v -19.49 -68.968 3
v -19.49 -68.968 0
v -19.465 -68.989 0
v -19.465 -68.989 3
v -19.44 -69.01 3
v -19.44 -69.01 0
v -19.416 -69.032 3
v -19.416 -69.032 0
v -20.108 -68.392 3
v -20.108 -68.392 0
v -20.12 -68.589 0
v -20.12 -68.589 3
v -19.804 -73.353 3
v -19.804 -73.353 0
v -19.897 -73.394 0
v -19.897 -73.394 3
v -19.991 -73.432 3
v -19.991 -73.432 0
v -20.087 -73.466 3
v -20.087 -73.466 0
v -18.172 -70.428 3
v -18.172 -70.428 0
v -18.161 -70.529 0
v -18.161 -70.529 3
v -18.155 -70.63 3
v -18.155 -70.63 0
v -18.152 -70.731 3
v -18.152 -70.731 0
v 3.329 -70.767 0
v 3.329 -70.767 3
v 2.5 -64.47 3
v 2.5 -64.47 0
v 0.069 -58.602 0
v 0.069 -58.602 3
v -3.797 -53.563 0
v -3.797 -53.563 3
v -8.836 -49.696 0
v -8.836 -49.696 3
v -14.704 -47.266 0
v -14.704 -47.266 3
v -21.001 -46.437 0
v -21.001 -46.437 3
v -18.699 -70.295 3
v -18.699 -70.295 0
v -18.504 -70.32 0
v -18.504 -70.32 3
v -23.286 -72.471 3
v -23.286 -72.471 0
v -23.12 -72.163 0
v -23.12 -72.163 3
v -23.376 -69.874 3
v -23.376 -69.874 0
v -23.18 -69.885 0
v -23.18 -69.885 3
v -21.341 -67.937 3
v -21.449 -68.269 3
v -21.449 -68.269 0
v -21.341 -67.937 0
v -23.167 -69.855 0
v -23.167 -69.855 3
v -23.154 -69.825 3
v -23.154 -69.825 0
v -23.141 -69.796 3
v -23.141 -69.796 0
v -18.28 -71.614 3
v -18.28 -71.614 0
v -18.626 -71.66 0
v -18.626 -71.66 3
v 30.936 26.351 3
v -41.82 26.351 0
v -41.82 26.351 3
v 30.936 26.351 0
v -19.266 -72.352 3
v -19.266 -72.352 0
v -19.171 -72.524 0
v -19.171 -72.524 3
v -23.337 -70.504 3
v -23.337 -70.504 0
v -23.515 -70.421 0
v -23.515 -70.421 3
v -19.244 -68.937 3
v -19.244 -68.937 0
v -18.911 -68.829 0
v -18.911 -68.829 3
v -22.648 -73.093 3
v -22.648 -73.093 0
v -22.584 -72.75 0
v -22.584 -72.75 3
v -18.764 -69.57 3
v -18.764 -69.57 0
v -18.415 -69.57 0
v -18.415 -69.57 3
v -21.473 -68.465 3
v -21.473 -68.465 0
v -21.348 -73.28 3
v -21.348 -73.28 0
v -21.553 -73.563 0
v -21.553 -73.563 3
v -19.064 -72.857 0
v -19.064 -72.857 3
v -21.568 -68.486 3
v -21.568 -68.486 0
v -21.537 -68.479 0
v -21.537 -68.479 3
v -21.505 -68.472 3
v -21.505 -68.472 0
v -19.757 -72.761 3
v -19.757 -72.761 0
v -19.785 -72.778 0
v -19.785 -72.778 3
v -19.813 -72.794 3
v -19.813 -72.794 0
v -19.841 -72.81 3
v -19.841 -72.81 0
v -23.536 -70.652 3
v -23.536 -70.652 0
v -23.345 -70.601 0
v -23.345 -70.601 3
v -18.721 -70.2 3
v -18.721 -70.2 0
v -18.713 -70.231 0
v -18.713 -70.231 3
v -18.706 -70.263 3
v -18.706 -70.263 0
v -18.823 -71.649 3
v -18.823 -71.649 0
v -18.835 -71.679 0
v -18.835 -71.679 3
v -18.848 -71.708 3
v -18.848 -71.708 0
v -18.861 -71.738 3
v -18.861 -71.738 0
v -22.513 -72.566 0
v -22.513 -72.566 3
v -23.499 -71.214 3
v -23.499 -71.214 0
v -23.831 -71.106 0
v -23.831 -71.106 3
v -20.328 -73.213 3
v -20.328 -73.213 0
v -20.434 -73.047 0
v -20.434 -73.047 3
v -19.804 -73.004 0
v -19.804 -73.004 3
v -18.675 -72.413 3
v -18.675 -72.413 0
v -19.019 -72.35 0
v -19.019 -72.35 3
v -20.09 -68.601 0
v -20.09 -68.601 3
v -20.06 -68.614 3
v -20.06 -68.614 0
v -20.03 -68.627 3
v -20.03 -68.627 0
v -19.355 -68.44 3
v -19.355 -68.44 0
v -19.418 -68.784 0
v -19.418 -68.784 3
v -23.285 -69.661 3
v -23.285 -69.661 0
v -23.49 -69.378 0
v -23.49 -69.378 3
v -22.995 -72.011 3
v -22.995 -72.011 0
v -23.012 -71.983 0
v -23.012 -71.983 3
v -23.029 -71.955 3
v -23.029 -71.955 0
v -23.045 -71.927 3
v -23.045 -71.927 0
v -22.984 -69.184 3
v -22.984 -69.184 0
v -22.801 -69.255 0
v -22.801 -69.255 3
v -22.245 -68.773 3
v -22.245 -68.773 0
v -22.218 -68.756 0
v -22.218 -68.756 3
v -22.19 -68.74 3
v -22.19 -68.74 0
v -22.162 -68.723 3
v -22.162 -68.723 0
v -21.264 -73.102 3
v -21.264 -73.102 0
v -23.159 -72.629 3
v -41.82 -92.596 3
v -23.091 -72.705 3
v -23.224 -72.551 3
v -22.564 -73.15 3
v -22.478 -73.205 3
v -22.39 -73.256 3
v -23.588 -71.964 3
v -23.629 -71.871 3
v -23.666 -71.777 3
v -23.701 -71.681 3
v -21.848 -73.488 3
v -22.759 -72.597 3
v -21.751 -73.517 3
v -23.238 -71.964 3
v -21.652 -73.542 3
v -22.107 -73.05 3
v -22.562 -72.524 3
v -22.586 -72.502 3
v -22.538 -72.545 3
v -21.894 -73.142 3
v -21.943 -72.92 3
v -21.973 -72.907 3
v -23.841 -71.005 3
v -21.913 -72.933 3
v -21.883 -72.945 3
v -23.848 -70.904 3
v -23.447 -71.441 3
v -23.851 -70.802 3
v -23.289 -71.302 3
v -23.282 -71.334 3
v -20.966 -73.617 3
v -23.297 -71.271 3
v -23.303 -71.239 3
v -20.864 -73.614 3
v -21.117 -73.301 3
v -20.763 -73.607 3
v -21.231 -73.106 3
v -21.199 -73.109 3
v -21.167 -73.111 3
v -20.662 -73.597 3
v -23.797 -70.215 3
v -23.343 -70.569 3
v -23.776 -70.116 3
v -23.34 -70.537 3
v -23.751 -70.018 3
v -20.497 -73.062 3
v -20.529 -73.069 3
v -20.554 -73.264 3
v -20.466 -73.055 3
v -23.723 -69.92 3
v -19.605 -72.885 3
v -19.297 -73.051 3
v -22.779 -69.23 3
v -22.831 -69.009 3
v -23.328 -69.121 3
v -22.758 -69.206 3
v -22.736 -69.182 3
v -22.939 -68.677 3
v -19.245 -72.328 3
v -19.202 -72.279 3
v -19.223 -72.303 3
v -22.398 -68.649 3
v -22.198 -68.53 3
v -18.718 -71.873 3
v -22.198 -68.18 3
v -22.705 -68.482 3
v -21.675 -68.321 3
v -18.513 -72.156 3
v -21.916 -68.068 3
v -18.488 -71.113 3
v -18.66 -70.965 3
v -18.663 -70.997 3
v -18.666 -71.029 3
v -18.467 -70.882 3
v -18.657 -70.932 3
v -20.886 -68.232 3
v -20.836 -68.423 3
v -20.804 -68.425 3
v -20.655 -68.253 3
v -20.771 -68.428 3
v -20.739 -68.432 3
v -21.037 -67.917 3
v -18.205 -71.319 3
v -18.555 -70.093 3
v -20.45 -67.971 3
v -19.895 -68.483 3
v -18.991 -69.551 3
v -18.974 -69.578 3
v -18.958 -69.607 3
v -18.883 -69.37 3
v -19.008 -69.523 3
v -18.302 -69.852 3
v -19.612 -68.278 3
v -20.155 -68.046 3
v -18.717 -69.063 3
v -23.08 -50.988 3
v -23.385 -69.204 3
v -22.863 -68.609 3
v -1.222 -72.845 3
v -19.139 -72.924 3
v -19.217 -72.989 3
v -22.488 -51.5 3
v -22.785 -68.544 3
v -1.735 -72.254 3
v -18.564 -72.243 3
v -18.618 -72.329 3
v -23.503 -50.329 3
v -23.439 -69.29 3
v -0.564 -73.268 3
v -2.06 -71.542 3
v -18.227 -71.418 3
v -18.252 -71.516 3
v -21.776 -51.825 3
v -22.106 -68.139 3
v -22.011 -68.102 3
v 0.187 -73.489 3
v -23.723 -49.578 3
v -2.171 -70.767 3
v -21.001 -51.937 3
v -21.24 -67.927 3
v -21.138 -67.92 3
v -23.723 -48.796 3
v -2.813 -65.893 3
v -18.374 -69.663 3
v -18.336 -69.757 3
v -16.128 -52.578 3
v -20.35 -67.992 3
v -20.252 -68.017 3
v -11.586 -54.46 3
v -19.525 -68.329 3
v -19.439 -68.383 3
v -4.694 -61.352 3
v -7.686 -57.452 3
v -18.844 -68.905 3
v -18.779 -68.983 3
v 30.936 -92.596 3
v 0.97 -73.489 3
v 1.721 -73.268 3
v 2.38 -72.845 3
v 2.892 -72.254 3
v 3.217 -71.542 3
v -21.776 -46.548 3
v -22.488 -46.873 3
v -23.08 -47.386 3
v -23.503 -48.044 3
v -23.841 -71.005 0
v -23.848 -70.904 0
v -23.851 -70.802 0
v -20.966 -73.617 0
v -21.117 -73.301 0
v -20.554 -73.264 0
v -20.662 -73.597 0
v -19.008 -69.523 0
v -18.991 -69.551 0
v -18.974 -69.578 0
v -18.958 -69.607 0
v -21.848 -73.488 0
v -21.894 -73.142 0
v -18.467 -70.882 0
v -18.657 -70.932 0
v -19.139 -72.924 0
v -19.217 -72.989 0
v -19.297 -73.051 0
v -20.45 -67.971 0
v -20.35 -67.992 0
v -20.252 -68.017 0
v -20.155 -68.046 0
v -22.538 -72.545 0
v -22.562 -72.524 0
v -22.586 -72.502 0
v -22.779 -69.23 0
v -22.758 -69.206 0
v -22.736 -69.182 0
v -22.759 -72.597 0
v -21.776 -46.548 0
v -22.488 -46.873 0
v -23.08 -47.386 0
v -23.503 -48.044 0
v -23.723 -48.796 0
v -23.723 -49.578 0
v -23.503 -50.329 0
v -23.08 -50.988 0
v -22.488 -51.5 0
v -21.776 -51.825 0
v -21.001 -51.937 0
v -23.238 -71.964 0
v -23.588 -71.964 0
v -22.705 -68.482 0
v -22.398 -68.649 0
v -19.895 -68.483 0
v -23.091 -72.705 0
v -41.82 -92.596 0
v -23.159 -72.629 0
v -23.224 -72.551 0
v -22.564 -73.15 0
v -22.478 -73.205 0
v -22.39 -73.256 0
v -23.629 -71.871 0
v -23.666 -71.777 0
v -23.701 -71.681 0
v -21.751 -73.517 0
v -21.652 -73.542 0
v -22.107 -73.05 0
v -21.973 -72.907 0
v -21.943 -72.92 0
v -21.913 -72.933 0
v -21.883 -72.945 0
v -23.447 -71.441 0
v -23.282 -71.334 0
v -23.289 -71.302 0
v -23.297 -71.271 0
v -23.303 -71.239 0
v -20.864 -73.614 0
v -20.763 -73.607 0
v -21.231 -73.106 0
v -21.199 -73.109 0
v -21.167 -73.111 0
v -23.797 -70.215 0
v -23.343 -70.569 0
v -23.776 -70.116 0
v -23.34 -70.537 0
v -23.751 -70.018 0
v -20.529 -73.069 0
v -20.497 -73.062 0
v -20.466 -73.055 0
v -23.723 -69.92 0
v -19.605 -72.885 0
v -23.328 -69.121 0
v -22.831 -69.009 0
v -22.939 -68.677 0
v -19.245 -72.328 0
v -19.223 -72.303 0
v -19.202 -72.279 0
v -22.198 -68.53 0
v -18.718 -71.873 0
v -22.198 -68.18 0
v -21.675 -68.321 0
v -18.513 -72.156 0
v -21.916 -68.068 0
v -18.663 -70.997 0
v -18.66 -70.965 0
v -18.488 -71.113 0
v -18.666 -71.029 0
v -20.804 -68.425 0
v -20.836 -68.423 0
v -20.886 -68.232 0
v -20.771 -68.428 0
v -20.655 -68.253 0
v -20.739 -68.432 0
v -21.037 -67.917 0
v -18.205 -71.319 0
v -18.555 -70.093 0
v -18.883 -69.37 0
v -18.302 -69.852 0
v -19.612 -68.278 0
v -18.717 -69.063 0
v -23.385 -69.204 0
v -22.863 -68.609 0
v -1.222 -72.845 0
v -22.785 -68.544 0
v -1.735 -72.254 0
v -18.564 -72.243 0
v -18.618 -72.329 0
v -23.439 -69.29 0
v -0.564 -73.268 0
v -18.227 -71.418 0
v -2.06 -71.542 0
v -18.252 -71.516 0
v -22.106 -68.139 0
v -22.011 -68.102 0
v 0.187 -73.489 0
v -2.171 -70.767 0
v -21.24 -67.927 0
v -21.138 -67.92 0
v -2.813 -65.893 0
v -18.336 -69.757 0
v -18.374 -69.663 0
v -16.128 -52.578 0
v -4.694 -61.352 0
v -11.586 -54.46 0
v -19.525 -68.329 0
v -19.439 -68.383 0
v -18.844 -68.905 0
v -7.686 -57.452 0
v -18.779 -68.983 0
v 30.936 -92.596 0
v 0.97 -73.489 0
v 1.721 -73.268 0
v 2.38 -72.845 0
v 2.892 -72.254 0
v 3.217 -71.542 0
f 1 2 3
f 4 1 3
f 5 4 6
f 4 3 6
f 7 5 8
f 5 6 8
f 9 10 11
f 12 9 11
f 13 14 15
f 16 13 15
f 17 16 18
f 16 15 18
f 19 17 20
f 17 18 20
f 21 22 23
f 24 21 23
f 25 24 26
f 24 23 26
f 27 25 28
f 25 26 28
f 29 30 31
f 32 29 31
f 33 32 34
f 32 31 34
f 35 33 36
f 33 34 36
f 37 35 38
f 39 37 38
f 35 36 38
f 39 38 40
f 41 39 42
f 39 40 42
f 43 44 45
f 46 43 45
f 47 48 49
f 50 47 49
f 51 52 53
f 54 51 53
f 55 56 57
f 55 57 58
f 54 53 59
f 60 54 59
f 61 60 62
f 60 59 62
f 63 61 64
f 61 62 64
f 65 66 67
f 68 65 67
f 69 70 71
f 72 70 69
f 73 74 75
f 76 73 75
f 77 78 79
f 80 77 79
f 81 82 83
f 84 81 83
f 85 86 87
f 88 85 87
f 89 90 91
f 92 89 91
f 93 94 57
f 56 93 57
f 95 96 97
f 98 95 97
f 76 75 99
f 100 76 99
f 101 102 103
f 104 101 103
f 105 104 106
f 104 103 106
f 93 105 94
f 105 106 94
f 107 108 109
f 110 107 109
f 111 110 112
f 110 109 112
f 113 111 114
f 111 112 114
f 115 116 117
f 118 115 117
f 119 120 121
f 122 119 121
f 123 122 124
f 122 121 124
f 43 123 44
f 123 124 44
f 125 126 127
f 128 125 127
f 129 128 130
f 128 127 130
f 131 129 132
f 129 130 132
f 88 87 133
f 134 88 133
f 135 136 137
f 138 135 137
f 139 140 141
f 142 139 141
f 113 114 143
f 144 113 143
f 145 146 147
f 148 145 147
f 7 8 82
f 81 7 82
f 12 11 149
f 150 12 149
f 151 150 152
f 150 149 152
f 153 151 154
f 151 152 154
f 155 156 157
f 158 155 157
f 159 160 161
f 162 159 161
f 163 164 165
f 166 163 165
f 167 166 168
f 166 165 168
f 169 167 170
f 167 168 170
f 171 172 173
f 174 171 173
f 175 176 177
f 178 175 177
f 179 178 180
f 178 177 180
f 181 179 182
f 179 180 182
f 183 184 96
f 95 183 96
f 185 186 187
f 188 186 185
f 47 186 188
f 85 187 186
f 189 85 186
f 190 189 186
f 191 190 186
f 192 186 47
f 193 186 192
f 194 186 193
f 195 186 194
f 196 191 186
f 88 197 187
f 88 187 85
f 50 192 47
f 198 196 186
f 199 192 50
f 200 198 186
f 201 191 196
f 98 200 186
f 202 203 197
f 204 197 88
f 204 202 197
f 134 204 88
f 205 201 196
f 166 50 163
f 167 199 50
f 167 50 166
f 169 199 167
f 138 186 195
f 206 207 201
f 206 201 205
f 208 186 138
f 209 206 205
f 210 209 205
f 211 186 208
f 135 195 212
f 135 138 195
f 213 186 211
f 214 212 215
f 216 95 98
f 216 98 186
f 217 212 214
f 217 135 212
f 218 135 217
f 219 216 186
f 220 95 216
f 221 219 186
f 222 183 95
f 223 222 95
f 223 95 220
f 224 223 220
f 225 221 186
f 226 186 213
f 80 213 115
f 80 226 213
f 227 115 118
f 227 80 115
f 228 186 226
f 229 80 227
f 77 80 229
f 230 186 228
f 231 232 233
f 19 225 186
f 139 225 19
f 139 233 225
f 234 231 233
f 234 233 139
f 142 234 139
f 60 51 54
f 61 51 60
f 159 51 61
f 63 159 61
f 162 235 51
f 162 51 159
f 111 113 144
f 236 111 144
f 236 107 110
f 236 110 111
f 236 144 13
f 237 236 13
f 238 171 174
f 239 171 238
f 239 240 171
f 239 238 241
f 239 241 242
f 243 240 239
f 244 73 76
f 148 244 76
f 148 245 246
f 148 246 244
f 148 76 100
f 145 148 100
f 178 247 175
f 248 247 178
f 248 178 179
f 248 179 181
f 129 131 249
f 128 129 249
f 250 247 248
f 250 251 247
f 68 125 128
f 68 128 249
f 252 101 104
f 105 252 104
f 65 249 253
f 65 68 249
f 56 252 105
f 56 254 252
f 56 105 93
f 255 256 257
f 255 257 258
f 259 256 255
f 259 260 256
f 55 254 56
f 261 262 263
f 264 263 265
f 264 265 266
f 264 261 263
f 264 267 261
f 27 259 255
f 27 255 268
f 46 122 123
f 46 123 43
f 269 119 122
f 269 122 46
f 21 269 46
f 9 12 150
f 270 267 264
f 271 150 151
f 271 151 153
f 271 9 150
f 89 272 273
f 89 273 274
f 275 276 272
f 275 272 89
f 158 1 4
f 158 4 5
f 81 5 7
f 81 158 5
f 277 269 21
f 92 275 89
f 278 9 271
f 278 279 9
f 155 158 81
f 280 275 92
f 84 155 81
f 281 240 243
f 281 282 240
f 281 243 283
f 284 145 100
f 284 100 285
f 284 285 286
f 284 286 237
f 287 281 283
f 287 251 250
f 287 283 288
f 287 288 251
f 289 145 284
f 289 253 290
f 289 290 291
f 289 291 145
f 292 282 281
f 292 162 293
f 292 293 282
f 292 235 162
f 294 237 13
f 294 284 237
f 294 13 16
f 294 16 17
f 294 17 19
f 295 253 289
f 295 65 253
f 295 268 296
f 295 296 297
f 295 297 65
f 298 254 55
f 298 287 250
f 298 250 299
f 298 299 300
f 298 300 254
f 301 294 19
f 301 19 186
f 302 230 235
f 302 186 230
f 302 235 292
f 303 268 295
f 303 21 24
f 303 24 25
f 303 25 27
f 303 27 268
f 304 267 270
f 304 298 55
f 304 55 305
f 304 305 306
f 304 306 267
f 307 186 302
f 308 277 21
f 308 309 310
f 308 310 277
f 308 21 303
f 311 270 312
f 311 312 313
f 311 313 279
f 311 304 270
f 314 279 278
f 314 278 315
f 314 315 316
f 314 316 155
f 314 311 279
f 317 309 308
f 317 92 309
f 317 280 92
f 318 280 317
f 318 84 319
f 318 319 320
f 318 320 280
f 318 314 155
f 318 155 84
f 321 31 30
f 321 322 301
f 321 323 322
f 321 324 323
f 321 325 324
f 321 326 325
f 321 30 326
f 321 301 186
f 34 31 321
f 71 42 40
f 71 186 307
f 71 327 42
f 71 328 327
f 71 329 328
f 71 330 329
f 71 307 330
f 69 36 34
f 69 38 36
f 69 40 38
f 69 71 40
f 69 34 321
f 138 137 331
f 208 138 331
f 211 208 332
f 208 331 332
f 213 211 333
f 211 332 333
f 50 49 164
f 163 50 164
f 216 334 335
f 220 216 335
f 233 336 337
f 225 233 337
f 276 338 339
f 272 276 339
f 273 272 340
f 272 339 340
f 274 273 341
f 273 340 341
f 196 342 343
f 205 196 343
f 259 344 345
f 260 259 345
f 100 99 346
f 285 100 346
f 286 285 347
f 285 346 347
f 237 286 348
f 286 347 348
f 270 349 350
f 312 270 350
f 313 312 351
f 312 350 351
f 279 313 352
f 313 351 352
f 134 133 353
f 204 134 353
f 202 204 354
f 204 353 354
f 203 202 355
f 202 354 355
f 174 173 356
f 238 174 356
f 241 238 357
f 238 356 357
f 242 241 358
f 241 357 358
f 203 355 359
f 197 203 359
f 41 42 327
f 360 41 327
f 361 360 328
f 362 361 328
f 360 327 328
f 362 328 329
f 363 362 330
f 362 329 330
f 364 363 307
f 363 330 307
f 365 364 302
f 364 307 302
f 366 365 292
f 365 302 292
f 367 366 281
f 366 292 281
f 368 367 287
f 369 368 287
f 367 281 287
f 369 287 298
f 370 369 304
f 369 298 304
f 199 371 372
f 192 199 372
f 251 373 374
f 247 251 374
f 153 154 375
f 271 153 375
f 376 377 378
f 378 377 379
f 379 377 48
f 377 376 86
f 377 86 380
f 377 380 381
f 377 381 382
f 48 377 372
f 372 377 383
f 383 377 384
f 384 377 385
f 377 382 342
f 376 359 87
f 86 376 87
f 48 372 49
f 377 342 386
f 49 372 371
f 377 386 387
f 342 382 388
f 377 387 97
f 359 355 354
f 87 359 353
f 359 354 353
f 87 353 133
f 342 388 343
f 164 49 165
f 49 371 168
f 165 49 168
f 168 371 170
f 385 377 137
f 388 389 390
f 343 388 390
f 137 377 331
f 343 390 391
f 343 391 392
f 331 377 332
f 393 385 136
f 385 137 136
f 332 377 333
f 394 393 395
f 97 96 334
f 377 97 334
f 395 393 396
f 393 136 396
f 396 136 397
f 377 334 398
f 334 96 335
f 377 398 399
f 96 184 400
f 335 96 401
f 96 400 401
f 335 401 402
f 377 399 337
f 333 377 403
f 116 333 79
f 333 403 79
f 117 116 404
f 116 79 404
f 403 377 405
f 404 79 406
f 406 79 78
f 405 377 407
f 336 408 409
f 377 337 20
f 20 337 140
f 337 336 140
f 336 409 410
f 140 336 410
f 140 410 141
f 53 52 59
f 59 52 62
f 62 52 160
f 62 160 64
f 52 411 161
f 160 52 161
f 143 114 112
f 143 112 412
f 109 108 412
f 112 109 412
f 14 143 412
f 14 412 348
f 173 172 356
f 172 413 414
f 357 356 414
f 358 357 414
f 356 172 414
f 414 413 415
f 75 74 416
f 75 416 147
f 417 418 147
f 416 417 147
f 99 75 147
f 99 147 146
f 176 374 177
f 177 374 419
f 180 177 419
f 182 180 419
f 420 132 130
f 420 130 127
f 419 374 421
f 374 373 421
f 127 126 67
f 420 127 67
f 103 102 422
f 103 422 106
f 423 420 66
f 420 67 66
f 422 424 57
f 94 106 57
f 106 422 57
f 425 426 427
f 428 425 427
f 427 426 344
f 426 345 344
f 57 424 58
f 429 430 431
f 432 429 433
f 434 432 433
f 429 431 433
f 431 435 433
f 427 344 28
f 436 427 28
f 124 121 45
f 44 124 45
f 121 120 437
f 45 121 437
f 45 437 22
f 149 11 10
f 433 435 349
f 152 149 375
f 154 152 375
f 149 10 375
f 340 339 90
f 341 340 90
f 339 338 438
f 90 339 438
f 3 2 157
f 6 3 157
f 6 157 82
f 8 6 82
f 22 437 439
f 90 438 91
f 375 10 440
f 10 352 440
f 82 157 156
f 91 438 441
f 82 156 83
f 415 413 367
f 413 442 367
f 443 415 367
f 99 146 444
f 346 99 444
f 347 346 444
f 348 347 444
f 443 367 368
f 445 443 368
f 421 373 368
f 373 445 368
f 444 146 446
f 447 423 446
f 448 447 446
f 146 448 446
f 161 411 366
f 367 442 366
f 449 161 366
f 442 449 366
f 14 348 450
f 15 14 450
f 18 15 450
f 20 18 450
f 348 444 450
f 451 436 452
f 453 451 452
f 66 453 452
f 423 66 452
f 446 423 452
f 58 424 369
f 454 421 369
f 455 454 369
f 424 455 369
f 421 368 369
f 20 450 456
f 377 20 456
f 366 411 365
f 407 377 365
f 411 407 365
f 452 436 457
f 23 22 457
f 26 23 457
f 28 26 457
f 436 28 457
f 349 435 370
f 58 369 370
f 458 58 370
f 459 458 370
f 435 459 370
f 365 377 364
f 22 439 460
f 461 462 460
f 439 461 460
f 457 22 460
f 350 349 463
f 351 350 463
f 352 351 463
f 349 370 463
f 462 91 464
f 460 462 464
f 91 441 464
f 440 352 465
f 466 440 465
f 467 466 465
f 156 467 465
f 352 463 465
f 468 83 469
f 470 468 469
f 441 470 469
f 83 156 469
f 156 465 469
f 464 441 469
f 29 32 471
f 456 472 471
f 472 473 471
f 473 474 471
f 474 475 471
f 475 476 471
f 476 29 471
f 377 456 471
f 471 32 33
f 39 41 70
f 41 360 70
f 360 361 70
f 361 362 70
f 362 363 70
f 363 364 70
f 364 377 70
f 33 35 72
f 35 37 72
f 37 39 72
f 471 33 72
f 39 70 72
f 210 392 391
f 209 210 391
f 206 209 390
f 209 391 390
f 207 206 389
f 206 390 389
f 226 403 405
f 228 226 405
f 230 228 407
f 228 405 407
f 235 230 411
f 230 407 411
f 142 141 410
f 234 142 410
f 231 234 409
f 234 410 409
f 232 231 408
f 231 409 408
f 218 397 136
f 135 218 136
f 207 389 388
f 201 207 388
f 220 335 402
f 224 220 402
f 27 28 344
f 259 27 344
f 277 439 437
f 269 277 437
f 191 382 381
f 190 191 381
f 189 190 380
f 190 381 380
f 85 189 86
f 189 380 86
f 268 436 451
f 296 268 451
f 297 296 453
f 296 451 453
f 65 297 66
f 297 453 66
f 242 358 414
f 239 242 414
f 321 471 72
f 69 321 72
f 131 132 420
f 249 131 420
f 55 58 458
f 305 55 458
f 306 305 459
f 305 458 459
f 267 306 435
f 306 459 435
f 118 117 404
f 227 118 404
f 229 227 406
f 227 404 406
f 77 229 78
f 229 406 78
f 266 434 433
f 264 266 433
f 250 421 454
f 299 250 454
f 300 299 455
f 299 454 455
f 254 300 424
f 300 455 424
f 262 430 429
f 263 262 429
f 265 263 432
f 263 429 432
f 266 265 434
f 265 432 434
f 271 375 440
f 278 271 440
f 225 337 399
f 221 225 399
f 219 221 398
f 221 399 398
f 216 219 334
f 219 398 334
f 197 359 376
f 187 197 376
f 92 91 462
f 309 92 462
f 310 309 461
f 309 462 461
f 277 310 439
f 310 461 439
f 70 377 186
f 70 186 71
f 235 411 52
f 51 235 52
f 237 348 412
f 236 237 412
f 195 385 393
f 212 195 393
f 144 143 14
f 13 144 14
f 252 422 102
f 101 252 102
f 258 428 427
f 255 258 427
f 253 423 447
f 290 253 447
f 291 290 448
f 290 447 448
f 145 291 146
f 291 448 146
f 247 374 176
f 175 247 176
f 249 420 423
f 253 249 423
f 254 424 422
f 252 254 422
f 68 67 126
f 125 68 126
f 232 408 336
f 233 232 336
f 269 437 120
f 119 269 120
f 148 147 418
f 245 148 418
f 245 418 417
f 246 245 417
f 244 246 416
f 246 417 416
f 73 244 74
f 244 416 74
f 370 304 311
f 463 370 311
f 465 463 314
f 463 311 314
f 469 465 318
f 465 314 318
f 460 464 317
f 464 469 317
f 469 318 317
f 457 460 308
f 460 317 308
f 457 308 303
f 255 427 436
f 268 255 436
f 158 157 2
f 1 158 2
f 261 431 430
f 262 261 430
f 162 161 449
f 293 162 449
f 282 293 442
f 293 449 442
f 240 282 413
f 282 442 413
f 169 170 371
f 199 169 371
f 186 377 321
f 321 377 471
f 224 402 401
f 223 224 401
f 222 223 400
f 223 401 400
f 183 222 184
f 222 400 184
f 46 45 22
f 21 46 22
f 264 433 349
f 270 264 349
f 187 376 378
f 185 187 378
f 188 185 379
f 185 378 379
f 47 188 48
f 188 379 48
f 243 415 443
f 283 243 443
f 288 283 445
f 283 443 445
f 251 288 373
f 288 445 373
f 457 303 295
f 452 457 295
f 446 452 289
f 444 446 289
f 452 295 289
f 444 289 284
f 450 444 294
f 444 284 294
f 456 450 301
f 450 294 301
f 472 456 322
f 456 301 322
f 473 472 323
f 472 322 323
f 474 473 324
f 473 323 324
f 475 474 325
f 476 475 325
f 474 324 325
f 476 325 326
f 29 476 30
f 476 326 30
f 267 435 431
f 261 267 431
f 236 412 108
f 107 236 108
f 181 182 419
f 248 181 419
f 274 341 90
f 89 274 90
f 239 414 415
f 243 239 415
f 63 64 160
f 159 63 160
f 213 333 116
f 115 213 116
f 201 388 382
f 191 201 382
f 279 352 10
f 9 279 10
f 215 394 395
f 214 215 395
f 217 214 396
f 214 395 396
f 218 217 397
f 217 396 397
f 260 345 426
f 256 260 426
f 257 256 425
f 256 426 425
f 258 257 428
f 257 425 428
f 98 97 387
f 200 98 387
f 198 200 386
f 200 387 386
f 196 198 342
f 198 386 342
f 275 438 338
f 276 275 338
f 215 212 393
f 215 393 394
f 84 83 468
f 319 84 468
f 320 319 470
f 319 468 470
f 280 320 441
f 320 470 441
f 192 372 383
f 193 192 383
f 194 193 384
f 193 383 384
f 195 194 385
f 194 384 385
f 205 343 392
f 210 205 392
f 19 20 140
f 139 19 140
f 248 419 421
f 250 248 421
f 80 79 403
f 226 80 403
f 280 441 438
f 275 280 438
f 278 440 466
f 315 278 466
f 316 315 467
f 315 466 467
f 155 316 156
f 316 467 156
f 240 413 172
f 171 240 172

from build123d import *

# Parameters (mm, degrees)
IZIM1_W                     = 72.756230931
IZIM1_H                     = 118.946953667
Y_KSEKLIK_EKSTR_ZYON1_DEPTH = 3
KES_EKSTR_ZYON3_DEPTH       = 4
CUT_EXTRUDE1_DEPTH          = 4


with BuildPart() as part:
    # Çizim1 → Yükseklik-Ekstrüzyon1 (new body)
    with BuildSketch(Plane.XY):
        with Locations((-5.442235915, -33.122673723)):
            Rectangle(IZIM1_W, IZIM1_H)
    extrude(amount=Y_KSEKLIK_EKSTR_ZYON1_DEPTH)

    # Çizim4 → Kes-Ekstrüzyon3 (cut, through all)
    with BuildSketch(Plane(origin=(0, 0, 0), x_dir=(-1, 0, 0), z_dir=(0, 0, -1))):
        with BuildLine():
            Line((20.655005016, -68.253457169), (20.449524021, -67.970805458))
            ThreePointArc((20.449524021, -67.970805458), (20.301021516, -68.004254914), (20.154516787, -68.045585584))
            Line((20.154516787, -68.045585584), (20.108492616, -68.391990267))
            Line((20.108492616, -68.391990267), (20.11956599, -68.588571002))
            ThreePointArc((20.11956599, -68.588571002), (20.074637279, -68.607301226), (20.030106153, -68.62695801))
            Line((20.030106153, -68.62695801), (19.895263796, -68.483486258))
            Line((19.895263796, -68.483486258), (19.612495575, -68.278165626))
            ThreePointArc((19.612495575, -68.278165626), (19.48159775, -68.355867746), (19.355035352, -68.440448001))
            Line((19.355035352, -68.440448001), (19.418308698, -68.784120683))
            Line((19.418308698, -68.784120683), (19.489586891, -68.967658211))
            ThreePointArc((19.489586891, -68.967658211), (19.452645105, -68.999355448), (19.416367768, -69.031811035))
            Line((19.416367768, -69.031811035), (19.243789855, -68.93702987))
            Line((19.243789855, -68.93702987), (18.911413732, -68.829138531))
            ThreePointArc((18.911413732, -68.829138531), (18.810933778, -68.943487291), (18.716702521, -69.063037825))
            Line((18.716702521, -69.063037825), (18.883079748, -69.37033743))
            Line((18.883079748, -69.37033743), (19.007585553, -69.522865819))
            ThreePointArc((19.007585553, -69.522865819), (18.982246812, -69.564427322), (18.957774342, -69.606504734))
            Line((18.957774342, -69.606504734), (18.764354003, -69.569691997))
            Line((18.764354003, -69.569691997), (18.414905268, -69.569791106))
            ThreePointArc((18.414905268, -69.569791106), (18.354678863, -69.709593253), (18.302002759, -69.852411628))
            Line((18.302002759, -69.852411628), (18.555197705, -70.093257528))
            Line((18.555197705, -70.093257528), (18.720743626, -70.199846237))
            ThreePointArc((18.720743626, -70.199846237), (18.709488262, -70.247203677), (18.699216195, -70.294784083))
            Line((18.699216195, -70.294784083), (18.503886761, -70.319543262))
            Line((18.503886761, -70.319543262), (18.17157189, -70.427623118))
            ThreePointArc((18.17157189, -70.427623118), (18.157494415, -70.579193843), (18.151529767, -70.7313))
            Line((18.151529767, -70.7313), (18.466757947, -70.882116522))
            Line((18.466757947, -70.882116522), (18.657139197, -70.932331906))
            ThreePointArc((18.657139197, -70.932331906), (18.661068963, -70.980849606), (18.666002801, -71.029275504))
            Line((18.666002801, -71.029275504), (18.487884476, -71.113182997))
            Line((18.487884476, -71.113182997), (18.205232766, -71.318663992))
            ThreePointArc((18.205232766, -71.318663992), (18.238682221, -71.467166497), (18.280012892, -71.613671226))
            Line((18.280012892, -71.613671226), (18.626417574, -71.659695397))
            Line((18.626417574, -71.659695397), (18.822998309, -71.648622023))
            ThreePointArc((18.822998309, -71.648622023), (18.841728533, -71.693550734), (18.861385317, -71.73808186))
            Line((18.861385317, -71.73808186), (18.717913565, -71.872924217))
            Line((18.717913565, -71.872924217), (18.512592933, -72.155692438))
            ThreePointArc((18.512592933, -72.155692438), (18.590295054, -72.286590263), (18.674875308, -72.413152661))
            Line((18.674875308, -72.413152661), (19.01854799, -72.349879315))
            Line((19.01854799, -72.349879315), (19.202085518, -72.278601122))
            ThreePointArc((19.202085518, -72.278601122), (19.233782755, -72.315542908), (19.266238342, -72.351820245))
            Line((19.266238342, -72.351820245), (19.171457178, -72.524398158))
            Line((19.171457178, -72.524398158), (19.063565838, -72.856774281))
            ThreePointArc((19.063565838, -72.856774281), (19.177914598, -72.957254235), (19.297465133, -73.051485492))
            Line((19.297465133, -73.051485492), (19.604764737, -72.885108265))
            Line((19.604764737, -72.885108265), (19.757293126, -72.76060246))
            ThreePointArc((19.757293126, -72.76060246), (19.79885463, -72.785941201), (19.840932041, -72.810413671))
            Line((19.840932041, -72.810413671), (19.804119305, -73.00383401))
            Line((19.804119305, -73.00383401), (19.804218414, -73.353282745))
            ThreePointArc((19.804218414, -73.353282745), (19.944020561, -73.41350915), (20.086838935, -73.466185254))
            Line((20.086838935, -73.466185254), (20.327684835, -73.212990308))
            Line((20.327684835, -73.212990308), (20.434273545, -73.047444387))
            ThreePointArc((20.434273545, -73.047444387), (20.481630985, -73.058699751), (20.52921139, -73.068971818))
            Line((20.52921139, -73.068971818), (20.553970569, -73.264301252))
            Line((20.553970569, -73.264301252), (20.662050425, -73.596616123))
            ThreePointArc((20.662050425, -73.596616123), (20.813621151, -73.610693598), (20.965727308, -73.616658246))
            Line((20.965727308, -73.616658246), (21.116543829, -73.301430066))
            Line((21.116543829, -73.301430066), (21.166759213, -73.111048816))
            ThreePointArc((21.166759213, -73.111048816), (21.215276914, -73.10711905), (21.263702812, -73.102185212))
            Line((21.263702812, -73.102185212), (21.347610305, -73.280303537))
            Line((21.347610305, -73.280303537), (21.553091299, -73.562955247))
            ThreePointArc((21.553091299, -73.562955247), (21.701593804, -73.529505792), (21.848098533, -73.488175121))
            Line((21.848098533, -73.488175121), (21.894122704, -73.141770439))
            Line((21.894122704, -73.141770439), (21.88304933, -72.945189704))
            ThreePointArc((21.88304933, -72.945189704), (21.927978041, -72.92645948), (21.972509167, -72.906802696))
            Line((21.972509167, -72.906802696), (22.107351525, -73.050274448))
            Line((22.107351525, -73.050274448), (22.390119745, -73.25559508))
            ThreePointArc((22.390119745, -73.25559508), (22.52101757, -73.177892959), (22.647579968, -73.093312705))
            Line((22.647579968, -73.093312705), (22.584306622, -72.749640023))
            Line((22.584306622, -72.749640023), (22.51302843, -72.566102495))
            ThreePointArc((22.51302843, -72.566102495), (22.549970215, -72.534405258), (22.586247553, -72.501949671))
            Line((22.586247553, -72.501949671), (22.758825465, -72.596730835))
            Line((22.758825465, -72.596730835), (23.091201588, -72.704622175))
            ThreePointArc((23.091201588, -72.704622175), (23.191681542, -72.590273415), (23.285912799, -72.47072288))
            Line((23.285912799, -72.47072288), (23.119535572, -72.163423276))
            Line((23.119535572, -72.163423276), (22.995029767, -72.010894887))
            ThreePointArc((22.995029767, -72.010894887), (23.020368508, -71.969333383), (23.044840978, -71.927255972))
            Line((23.044840978, -71.927255972), (23.238261317, -71.964068708))
            Line((23.238261317, -71.964068708), (23.587710053, -71.963969599))
            ThreePointArc((23.587710053, -71.963969599), (23.647936457, -71.824167452), (23.700612562, -71.681349078))
            Line((23.700612562, -71.681349078), (23.447417615, -71.440503178))
            Line((23.447417615, -71.440503178), (23.281871694, -71.333914468))
            ThreePointArc((23.281871694, -71.333914468), (23.293127058, -71.286557028), (23.303399125, -71.238976623))
            Line((23.303399125, -71.238976623), (23.49872856, -71.214217444))
            Line((23.49872856, -71.214217444), (23.83104343, -71.106137588))
            ThreePointArc((23.83104343, -71.106137588), (23.845120905, -70.954566862), (23.851085553, -70.802460705))
            Line((23.851085553, -70.802460705), (23.535857373, -70.651644184))
            Line((23.535857373, -70.651644184), (23.345476123, -70.6014288))
            ThreePointArc((23.345476123, -70.6014288), (23.341546357, -70.552911099), (23.336612519, -70.504485201))
            Line((23.336612519, -70.504485201), (23.514730844, -70.420577708))
            Line((23.514730844, -70.420577708), (23.797382555, -70.215096714))
            ThreePointArc((23.797382555, -70.215096714), (23.763933099, -70.066594209), (23.722602429, -69.92008948))
            Line((23.722602429, -69.92008948), (23.376197746, -69.874065309))
            Line((23.376197746, -69.874065309), (23.179617011, -69.885138683))
            ThreePointArc((23.179617011, -69.885138683), (23.160886787, -69.840209972), (23.141230003, -69.795678846))
            Line((23.141230003, -69.795678846), (23.284701755, -69.660836488))
            Line((23.284701755, -69.660836488), (23.490022387, -69.378068268))
            ThreePointArc((23.490022387, -69.378068268), (23.412320267, -69.247170443), (23.327740012, -69.120608045))
            Line((23.327740012, -69.120608045), (22.98406733, -69.183881391))
            Line((22.98406733, -69.183881391), (22.800529802, -69.255159583))
            ThreePointArc((22.800529802, -69.255159583), (22.768832565, -69.218217798), (22.736376978, -69.18194046))
            Line((22.736376978, -69.18194046), (22.831158143, -69.009362548))
            Line((22.831158143, -69.009362548), (22.939049482, -68.676986425))
            ThreePointArc((22.939049482, -68.676986425), (22.824700722, -68.576506471), (22.705150188, -68.482275214))
            Line((22.705150188, -68.482275214), (22.397850583, -68.648652441))
            Line((22.397850583, -68.648652441), (22.245322194, -68.773158246))
            ThreePointArc((22.245322194, -68.773158246), (22.203760691, -68.747819505), (22.161683279, -68.723347035))
            Line((22.161683279, -68.723347035), (22.198496016, -68.529926696))
            Line((22.198496016, -68.529926696), (22.198396907, -68.18047796))
            ThreePointArc((22.198396907, -68.18047796), (22.05859476, -68.120251556), (21.915776385, -68.067575451))
            Line((21.915776385, -68.067575451), (21.674930485, -68.320770398))
            Line((21.674930485, -68.320770398), (21.568341776, -68.486316319))
            ThreePointArc((21.568341776, -68.486316319), (21.520984336, -68.475060955), (21.47340393, -68.464788888))
            Line((21.47340393, -68.464788888), (21.448644751, -68.269459453))
            Line((21.448644751, -68.269459453), (21.340564895, -67.937144583))
            ThreePointArc((21.340564895, -67.937144583), (21.18899417, -67.923067108), (21.036888013, -67.91710246))
            Line((21.036888013, -67.91710246), (20.886071491, -68.23233064))
            Line((20.886071491, -68.23233064), (20.835856107, -68.42271189))
            ThreePointArc((20.835856107, -68.42271189), (20.787338407, -68.426641656), (20.738912509, -68.431575494))
            Line((20.738912509, -68.431575494), (20.655005016, -68.253457169))
        make_face()
    extrude(amount=-KES_EKSTR_ZYON3_DEPTH, mode=Mode.SUBTRACT)

    # Sketch1 → Cut-Extrude1 (cut, through all)
    with BuildSketch(Plane.XY.offset(3)):
        with BuildLine():
            ThreePointArc((3.32869234, -70.766880353), (-3.797399674, -53.562972367), (-21.00130766, -46.436880353))
            ThreePointArc((-21.00130766, -46.436880353), (-23.75130766, -49.186880353), (-21.00130766, -51.936880353))
            ThreePointArc((-21.00130766, -51.936880353), (-7.68648697, -57.452059663), (-2.17130766, -70.766880353))
            ThreePointArc((-2.17130766, -70.766880353), (0.57869234, -73.516880353), (3.32869234, -70.766880353))
        make_face()
    extrude(amount=-CUT_EXTRUDE1_DEPTH, mode=Mode.SUBTRACT)


solid = part.part
